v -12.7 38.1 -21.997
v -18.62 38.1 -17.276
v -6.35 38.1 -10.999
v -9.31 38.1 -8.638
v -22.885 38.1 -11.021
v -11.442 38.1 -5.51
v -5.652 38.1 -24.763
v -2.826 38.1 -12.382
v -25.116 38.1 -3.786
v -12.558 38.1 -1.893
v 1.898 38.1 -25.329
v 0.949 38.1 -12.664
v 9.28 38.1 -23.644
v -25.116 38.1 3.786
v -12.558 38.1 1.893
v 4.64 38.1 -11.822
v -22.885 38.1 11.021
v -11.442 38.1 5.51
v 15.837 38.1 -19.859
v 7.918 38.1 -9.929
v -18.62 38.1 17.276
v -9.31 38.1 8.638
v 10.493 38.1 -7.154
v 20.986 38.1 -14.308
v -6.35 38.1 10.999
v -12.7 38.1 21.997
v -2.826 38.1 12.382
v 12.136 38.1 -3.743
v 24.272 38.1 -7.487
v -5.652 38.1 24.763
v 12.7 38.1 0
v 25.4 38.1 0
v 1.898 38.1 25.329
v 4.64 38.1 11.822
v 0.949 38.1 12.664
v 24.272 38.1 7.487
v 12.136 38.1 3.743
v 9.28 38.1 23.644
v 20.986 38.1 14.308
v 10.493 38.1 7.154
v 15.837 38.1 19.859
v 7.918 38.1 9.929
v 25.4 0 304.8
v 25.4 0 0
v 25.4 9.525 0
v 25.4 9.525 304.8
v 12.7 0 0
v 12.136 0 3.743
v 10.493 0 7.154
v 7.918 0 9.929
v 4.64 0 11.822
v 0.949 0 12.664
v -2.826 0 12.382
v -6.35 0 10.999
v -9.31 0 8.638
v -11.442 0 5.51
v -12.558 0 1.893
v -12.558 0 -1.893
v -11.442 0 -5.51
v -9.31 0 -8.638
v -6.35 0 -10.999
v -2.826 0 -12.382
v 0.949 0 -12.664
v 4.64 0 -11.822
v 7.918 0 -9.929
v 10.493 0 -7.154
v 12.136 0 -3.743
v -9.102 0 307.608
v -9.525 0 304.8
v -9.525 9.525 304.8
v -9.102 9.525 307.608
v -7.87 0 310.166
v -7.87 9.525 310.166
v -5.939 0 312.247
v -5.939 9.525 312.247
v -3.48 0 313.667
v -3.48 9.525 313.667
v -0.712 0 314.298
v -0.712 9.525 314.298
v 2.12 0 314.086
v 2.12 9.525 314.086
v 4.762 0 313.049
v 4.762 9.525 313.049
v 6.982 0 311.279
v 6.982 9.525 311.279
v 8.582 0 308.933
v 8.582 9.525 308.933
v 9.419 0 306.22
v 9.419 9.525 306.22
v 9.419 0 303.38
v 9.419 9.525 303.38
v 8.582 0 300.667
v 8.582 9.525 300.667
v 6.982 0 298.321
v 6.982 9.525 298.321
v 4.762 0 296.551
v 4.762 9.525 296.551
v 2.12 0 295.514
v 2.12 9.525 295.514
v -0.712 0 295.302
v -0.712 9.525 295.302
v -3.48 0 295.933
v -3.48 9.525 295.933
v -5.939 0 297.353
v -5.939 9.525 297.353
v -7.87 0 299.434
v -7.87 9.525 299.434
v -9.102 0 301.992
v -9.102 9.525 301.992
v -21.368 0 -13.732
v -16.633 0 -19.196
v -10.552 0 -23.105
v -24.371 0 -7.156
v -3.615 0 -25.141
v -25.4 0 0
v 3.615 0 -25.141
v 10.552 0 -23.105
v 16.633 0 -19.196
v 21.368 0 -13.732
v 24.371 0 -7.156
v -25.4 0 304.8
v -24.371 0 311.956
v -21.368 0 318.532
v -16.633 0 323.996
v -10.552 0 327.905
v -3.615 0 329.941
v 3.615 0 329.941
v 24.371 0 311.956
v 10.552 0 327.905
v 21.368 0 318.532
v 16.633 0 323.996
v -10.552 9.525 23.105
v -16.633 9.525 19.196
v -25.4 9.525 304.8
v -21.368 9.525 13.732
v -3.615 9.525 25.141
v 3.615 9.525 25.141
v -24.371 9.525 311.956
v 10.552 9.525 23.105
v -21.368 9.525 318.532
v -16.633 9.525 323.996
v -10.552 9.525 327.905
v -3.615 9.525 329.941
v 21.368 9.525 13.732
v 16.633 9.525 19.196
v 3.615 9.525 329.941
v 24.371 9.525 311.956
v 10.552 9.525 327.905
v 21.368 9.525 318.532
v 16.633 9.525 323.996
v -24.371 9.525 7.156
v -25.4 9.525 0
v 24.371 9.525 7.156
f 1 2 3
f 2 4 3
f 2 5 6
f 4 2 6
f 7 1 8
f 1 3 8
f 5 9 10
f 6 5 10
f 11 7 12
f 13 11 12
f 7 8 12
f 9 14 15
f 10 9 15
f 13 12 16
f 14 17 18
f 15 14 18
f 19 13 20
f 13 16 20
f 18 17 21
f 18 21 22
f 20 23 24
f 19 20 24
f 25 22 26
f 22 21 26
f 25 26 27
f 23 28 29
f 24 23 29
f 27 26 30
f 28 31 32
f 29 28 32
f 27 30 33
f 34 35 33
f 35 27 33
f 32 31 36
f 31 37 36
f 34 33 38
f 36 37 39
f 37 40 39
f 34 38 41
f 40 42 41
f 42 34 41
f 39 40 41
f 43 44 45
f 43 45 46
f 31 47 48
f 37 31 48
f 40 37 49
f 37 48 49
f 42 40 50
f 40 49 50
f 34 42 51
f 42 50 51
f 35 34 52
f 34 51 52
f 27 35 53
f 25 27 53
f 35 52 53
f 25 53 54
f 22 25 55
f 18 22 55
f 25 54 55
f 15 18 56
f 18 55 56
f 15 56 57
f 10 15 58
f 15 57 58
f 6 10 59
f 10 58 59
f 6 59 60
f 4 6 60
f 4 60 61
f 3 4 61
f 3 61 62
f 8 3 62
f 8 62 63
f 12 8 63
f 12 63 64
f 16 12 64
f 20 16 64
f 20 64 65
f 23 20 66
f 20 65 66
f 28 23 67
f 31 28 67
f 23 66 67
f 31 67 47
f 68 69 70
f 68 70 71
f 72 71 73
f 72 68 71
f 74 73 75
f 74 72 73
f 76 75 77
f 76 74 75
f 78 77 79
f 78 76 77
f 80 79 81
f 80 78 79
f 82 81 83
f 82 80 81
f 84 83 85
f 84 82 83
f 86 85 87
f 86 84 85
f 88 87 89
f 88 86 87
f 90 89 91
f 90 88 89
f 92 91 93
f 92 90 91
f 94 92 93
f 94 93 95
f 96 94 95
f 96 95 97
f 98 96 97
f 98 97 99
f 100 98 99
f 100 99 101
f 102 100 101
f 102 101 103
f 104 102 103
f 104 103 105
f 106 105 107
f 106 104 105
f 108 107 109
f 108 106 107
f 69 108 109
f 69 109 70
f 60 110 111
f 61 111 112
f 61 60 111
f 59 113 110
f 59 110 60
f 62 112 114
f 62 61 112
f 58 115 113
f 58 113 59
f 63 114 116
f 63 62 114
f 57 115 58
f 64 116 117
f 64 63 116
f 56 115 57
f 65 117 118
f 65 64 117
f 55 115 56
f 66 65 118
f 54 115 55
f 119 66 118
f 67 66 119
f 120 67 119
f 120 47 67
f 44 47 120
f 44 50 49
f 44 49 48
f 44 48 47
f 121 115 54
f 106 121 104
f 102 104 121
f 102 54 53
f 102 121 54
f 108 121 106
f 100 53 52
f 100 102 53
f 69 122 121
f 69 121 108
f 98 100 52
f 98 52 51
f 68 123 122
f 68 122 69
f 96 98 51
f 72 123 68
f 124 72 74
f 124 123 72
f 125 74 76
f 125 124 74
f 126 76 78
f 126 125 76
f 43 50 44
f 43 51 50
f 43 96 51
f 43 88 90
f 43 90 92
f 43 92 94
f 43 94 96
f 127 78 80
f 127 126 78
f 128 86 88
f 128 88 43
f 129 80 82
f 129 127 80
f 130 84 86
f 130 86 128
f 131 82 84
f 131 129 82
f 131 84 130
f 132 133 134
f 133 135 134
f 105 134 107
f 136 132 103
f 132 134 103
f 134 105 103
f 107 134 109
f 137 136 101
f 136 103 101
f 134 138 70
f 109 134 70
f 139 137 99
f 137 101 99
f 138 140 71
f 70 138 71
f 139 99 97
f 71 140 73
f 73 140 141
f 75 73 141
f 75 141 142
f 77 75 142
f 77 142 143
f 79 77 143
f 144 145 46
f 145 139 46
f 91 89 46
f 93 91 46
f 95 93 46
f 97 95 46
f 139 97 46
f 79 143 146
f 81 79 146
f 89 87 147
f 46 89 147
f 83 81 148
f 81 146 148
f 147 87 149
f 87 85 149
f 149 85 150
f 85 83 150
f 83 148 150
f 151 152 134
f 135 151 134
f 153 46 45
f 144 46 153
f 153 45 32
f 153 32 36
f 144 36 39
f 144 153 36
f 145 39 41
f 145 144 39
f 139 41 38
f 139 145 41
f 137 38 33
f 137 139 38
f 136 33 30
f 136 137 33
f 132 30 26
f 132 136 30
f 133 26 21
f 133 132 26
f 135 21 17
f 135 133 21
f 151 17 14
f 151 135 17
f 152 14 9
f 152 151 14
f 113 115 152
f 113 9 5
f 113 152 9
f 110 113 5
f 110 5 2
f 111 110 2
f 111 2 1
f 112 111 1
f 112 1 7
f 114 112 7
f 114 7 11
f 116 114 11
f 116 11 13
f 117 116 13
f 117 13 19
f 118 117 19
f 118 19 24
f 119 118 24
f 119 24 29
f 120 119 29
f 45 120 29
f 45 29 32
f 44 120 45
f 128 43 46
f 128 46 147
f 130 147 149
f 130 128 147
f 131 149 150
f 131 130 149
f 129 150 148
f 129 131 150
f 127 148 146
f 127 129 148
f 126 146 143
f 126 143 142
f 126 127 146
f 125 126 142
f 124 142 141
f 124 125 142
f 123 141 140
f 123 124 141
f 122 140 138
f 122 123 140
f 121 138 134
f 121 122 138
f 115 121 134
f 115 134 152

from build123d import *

# Parameters (mm, degrees)
F0_R     = 25.4
F0_R_2   = 12.7
F1_DEPTH = 38.1
F3_DEPTH = 9.525


with BuildPart() as f1:
    # F0 (on Front) → F1 (new body)
    with BuildSketch(Plane.XZ):
        Circle(F0_R)
        Circle(F0_R_2, mode=Mode.SUBTRACT)
    extrude(amount=-F1_DEPTH)

    # F2 (on Front) → F3 (join)
    with BuildSketch(Plane.XZ):
        with BuildLine():
            ThreePointArc((-12.7, 0), (0, 12.7), (12.7, 0))
            Line((12.7, 0), (25.4, 0))
            Line((25.4, 0), (25.4, 304.8))
            Line((25.4, 304.8), (9.525, 304.8))
            ThreePointArc((9.525, 304.8), (0, 295.275), (-9.525, 304.8))
            Line((-9.525, 304.8), (-25.4, 304.8))
            Line((-25.4, 304.8), (-25.4, 0))
            Line((-25.4, 0), (-12.7, 0))
        make_face()
        with BuildLine():
            Line((9.525, 304.8), (25.4, 304.8))
            ThreePointArc((25.4, 304.8), (0, 330.2), (-25.4, 304.8))
            Line((-25.4, 304.8), (-9.525, 304.8))
            ThreePointArc((-9.525, 304.8), (0, 314.325), (9.525, 304.8))
        make_face()
    extrude(amount=-F3_DEPTH)


solid = f1.part
